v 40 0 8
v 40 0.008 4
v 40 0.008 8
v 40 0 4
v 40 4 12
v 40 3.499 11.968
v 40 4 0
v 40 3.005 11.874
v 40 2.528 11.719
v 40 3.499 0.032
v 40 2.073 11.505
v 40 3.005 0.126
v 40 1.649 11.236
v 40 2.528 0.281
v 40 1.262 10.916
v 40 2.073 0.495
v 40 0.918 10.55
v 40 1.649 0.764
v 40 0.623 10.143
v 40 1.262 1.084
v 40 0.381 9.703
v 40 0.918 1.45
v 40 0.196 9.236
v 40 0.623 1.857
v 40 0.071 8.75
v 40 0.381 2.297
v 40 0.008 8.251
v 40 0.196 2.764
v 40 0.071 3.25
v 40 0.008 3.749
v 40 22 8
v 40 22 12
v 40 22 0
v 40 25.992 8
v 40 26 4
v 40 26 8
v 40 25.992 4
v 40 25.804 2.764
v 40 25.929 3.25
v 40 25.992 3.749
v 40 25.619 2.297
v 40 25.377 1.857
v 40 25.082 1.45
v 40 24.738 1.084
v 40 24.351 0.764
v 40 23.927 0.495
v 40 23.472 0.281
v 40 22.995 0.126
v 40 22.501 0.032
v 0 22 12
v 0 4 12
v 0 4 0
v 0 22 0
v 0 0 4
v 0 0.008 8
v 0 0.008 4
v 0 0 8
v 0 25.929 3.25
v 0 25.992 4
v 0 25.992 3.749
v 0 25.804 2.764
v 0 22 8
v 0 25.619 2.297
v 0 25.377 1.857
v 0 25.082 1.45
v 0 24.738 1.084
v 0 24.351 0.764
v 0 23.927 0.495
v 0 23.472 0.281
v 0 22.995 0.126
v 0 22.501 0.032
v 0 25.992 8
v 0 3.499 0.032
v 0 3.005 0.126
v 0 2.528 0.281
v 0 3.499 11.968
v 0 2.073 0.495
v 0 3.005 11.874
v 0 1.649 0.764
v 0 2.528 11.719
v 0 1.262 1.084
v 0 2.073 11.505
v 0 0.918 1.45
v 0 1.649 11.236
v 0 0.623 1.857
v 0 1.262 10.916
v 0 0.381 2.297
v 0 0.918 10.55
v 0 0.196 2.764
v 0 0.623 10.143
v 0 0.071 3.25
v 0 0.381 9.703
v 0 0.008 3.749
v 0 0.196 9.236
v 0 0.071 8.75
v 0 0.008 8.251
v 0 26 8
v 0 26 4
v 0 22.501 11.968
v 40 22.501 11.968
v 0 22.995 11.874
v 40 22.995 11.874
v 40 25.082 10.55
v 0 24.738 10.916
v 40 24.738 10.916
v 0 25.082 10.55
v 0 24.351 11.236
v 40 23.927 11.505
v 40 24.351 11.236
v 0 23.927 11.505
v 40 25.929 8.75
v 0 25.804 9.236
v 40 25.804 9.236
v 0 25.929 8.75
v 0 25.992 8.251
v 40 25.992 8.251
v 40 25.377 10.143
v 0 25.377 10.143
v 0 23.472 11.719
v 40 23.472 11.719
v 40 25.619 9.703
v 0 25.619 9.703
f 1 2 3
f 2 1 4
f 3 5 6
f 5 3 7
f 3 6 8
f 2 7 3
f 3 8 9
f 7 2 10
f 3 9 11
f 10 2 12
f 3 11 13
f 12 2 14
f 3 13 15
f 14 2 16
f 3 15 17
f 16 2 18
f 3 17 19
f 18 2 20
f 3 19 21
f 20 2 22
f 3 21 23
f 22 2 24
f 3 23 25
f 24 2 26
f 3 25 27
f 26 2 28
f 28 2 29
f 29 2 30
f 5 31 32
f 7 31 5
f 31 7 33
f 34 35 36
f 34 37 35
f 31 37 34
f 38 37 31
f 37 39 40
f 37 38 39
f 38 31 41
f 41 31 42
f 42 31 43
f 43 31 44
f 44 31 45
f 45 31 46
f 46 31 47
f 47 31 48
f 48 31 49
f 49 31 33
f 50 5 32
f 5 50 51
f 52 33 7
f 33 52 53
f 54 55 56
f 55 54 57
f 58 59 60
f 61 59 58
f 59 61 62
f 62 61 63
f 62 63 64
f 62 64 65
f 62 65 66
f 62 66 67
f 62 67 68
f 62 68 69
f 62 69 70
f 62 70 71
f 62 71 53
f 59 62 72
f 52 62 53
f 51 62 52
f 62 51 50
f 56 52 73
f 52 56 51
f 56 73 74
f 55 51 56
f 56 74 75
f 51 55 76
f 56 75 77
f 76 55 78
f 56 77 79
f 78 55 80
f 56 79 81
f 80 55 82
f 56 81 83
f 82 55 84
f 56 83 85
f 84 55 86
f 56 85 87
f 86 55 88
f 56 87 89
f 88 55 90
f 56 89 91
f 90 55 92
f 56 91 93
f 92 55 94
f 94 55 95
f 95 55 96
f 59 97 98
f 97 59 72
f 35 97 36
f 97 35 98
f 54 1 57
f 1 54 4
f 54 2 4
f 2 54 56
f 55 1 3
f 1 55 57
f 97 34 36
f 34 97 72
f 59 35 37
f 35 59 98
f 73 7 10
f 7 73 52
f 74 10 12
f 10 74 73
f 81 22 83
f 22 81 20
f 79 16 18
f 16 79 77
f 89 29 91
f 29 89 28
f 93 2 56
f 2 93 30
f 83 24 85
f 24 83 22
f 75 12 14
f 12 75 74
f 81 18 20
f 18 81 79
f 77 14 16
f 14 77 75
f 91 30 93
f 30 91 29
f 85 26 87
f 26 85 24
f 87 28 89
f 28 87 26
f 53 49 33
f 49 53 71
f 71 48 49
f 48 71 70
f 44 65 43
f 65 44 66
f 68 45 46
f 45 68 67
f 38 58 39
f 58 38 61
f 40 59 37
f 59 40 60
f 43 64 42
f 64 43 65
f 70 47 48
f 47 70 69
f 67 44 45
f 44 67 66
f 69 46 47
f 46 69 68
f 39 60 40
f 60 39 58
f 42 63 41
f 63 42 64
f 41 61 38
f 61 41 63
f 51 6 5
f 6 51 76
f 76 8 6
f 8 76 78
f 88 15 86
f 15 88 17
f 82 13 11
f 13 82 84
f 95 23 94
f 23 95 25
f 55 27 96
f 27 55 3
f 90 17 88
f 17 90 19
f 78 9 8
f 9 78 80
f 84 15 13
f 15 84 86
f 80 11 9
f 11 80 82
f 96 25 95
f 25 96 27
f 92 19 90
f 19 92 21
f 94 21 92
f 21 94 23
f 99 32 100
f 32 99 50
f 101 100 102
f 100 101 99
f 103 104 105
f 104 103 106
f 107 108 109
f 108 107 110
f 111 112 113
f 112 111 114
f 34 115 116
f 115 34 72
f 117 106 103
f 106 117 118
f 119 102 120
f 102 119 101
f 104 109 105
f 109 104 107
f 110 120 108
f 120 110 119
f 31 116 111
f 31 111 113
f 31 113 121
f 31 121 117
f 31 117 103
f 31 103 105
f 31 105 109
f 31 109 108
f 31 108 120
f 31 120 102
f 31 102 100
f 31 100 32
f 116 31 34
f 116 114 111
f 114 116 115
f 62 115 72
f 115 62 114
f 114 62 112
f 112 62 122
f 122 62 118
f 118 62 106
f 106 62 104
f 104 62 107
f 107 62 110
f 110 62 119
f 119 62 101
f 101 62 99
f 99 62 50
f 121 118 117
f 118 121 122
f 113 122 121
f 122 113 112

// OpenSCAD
/*******************************************************************
*
** written by ...
*
** aka SnapBanane
*
** ? purpose
*
** informatic lectures and 3d design usage
*
** ? date
*
** written on: 07.11.24
*
*******************************************************************/

module roundedgcube(x, y, z, ra) {
    union() {
        difference() {
            cube([x,y,z]);
        translate([-1,-0.1,-0.1])
            cube([x+2,ra+0.1,ra+0.1]);
        translate([-1,-0.1,z-ra])
            cube([x+2,ra+0.1,ra+0.1]);
        translate([-1,y-ra,z-ra])
            cube([x+2,ra+0.1,ra+0.1]);
        translate([-1,y-ra,-0.1])
            cube([x+2,ra+0.1,ra+0.1]);
        }
    }
    union() {
        translate([x,ra,ra]) rotate([0,-90,0]) //bottom left
            difference() {
                cylinder(h=x, r=ra);
                union() {
                    translate([0,-ra,-1])
                        cube([ra, ra*2, x+2]);
                    translate([-ra-1,0,-1])
                        cube([ra+2, ra, x+2]);
                }
            }
        translate([0,y-ra,ra]) rotate([180,-90,0]) //bottom right
            difference() {
                cylinder(h=x, r=ra);
                union() {
                    translate([0,-ra,-1])
                        cube([ra, ra*2, x+2]);
                    translate([-ra-1,0,-1])
                        cube([ra+2, ra, x+2]);
                }
            }
        translate([0,ra,z-ra]) rotate([0,90,0]) //top left
            difference() {
                cylinder(h=x, r=ra);
                union() {
                    translate([0,-ra,-1])
                        cube([ra, ra*2, x+2]);
                    translate([-ra-1,0,-1])
                        cube([ra+2, ra, x+2]);
                }
            }
        translate([x,y-ra,z-ra]) rotate([180,90,0]) //top right
            difference() {
                cylinder(h=x, r=ra);
                union() {
                    translate([0,-ra,-1])
                        cube([ra, ra*2, x+2]);
                    translate([-ra-1,0,-1])
                        cube([ra+2, ra, x+2]);
                }
            }
    }
}

/******************************************************************/
roundedgcube(40, 26, 12, 4);
/*******************************************************************
*
*   ? roundededgcube()
*
** usage:
** roundededgcube(x, y, z, edgeness);
*
** x = x of the cube
*
** y = y of the cube
*
** z = z of the cube
*
** edgeness = how round you want the edges (keep it low, between 
** 0-10 depending on the size of the cube)
*
******************************************************************/
$fn=50;
/******************************************************************
*
*   ? $fn
*
** how many faces you want the shape to have
*
******************************************************************/
